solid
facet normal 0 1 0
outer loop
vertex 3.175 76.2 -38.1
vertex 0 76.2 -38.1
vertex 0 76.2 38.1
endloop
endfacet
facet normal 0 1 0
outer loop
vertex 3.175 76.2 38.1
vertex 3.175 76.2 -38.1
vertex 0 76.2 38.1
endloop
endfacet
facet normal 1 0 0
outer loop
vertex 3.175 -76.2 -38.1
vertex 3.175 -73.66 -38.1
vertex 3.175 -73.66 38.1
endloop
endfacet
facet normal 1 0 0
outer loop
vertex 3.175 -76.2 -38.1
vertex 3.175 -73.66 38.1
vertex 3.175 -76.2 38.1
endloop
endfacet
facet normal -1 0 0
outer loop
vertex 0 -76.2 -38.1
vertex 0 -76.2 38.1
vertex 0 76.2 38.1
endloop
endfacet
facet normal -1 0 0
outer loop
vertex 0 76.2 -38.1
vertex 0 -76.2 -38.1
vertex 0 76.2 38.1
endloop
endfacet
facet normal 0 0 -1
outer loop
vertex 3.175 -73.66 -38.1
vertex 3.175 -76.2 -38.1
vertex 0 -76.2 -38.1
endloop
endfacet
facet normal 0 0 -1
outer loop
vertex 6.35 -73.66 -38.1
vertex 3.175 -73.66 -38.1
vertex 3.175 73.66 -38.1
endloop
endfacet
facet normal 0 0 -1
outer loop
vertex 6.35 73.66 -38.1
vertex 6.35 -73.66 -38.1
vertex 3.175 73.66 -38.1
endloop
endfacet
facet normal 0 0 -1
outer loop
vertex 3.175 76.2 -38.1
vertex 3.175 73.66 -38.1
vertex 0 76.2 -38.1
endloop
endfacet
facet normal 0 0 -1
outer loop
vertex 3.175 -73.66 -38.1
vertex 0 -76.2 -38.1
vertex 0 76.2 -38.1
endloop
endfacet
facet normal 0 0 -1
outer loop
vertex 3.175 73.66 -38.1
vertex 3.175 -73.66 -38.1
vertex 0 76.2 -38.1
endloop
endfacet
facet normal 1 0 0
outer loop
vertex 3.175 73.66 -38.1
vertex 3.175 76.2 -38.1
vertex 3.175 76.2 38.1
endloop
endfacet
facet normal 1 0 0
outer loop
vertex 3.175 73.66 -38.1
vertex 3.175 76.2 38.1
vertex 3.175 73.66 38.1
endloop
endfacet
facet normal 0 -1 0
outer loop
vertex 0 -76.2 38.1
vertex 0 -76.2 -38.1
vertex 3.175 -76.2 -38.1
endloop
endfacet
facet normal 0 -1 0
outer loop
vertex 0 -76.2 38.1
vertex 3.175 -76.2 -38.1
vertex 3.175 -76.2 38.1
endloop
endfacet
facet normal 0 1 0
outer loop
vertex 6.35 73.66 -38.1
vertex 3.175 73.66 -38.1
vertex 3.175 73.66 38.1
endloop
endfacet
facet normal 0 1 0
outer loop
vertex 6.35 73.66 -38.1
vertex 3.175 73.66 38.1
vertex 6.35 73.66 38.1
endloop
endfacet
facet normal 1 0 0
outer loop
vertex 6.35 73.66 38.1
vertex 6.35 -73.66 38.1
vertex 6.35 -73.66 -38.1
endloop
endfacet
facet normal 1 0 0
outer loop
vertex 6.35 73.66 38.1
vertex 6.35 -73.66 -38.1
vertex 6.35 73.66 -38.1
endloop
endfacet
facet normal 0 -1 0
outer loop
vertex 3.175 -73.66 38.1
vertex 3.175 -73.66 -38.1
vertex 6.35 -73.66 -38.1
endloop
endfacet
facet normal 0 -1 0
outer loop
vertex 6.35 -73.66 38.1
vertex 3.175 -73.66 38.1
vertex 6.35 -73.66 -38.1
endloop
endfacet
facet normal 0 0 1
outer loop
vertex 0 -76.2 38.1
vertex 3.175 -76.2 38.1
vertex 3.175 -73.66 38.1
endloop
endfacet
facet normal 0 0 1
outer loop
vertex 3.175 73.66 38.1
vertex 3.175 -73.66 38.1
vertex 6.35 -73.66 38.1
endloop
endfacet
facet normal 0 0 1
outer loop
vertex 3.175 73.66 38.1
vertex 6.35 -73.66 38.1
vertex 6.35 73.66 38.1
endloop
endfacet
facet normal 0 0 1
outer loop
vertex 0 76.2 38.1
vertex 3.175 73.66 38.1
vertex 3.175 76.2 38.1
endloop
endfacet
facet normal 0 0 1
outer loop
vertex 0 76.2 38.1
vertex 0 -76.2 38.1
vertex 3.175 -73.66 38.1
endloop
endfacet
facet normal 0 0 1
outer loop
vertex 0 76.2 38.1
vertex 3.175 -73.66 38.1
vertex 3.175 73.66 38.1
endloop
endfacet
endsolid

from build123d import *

# Parameters (mm, degrees)
F0_W     = 152.4
F0_H     = 76.2
F1_DEPTH = 6.35
F2_W     = 3.175
F2_H     = 2.54
F3_DEPTH = 152.4
F4_W     = 3.175
F4_H     = 2.54
F5_DEPTH = 152.4


with BuildPart() as f1:
    # F0 (on Right) → F1 (new body)
    with BuildSketch(Plane.YZ):
        Rectangle(F0_W, F0_H)
    extrude(amount=F1_DEPTH)

    # F2 (on face) → F3 (cut)
    with BuildSketch(Plane(origin=(0, 0, -38.1), x_dir=(1, 0, 0), z_dir=(0, 0, -1))):
        with Locations((4.7625, 74.93)):
            Rectangle(F2_W, F2_H)
    extrude(amount=-F3_DEPTH, mode=Mode.SUBTRACT)

    # F4 (on face) → F5 (cut)
    with BuildSketch(Plane(origin=(0, 0, -38.1), x_dir=(1, 0, 0), z_dir=(0, 0, -1))):
        with Locations((4.7625, -74.93)):
            Rectangle(F4_W, F4_H)
    extrude(amount=-F5_DEPTH, mode=Mode.SUBTRACT)


solid = f1.part
